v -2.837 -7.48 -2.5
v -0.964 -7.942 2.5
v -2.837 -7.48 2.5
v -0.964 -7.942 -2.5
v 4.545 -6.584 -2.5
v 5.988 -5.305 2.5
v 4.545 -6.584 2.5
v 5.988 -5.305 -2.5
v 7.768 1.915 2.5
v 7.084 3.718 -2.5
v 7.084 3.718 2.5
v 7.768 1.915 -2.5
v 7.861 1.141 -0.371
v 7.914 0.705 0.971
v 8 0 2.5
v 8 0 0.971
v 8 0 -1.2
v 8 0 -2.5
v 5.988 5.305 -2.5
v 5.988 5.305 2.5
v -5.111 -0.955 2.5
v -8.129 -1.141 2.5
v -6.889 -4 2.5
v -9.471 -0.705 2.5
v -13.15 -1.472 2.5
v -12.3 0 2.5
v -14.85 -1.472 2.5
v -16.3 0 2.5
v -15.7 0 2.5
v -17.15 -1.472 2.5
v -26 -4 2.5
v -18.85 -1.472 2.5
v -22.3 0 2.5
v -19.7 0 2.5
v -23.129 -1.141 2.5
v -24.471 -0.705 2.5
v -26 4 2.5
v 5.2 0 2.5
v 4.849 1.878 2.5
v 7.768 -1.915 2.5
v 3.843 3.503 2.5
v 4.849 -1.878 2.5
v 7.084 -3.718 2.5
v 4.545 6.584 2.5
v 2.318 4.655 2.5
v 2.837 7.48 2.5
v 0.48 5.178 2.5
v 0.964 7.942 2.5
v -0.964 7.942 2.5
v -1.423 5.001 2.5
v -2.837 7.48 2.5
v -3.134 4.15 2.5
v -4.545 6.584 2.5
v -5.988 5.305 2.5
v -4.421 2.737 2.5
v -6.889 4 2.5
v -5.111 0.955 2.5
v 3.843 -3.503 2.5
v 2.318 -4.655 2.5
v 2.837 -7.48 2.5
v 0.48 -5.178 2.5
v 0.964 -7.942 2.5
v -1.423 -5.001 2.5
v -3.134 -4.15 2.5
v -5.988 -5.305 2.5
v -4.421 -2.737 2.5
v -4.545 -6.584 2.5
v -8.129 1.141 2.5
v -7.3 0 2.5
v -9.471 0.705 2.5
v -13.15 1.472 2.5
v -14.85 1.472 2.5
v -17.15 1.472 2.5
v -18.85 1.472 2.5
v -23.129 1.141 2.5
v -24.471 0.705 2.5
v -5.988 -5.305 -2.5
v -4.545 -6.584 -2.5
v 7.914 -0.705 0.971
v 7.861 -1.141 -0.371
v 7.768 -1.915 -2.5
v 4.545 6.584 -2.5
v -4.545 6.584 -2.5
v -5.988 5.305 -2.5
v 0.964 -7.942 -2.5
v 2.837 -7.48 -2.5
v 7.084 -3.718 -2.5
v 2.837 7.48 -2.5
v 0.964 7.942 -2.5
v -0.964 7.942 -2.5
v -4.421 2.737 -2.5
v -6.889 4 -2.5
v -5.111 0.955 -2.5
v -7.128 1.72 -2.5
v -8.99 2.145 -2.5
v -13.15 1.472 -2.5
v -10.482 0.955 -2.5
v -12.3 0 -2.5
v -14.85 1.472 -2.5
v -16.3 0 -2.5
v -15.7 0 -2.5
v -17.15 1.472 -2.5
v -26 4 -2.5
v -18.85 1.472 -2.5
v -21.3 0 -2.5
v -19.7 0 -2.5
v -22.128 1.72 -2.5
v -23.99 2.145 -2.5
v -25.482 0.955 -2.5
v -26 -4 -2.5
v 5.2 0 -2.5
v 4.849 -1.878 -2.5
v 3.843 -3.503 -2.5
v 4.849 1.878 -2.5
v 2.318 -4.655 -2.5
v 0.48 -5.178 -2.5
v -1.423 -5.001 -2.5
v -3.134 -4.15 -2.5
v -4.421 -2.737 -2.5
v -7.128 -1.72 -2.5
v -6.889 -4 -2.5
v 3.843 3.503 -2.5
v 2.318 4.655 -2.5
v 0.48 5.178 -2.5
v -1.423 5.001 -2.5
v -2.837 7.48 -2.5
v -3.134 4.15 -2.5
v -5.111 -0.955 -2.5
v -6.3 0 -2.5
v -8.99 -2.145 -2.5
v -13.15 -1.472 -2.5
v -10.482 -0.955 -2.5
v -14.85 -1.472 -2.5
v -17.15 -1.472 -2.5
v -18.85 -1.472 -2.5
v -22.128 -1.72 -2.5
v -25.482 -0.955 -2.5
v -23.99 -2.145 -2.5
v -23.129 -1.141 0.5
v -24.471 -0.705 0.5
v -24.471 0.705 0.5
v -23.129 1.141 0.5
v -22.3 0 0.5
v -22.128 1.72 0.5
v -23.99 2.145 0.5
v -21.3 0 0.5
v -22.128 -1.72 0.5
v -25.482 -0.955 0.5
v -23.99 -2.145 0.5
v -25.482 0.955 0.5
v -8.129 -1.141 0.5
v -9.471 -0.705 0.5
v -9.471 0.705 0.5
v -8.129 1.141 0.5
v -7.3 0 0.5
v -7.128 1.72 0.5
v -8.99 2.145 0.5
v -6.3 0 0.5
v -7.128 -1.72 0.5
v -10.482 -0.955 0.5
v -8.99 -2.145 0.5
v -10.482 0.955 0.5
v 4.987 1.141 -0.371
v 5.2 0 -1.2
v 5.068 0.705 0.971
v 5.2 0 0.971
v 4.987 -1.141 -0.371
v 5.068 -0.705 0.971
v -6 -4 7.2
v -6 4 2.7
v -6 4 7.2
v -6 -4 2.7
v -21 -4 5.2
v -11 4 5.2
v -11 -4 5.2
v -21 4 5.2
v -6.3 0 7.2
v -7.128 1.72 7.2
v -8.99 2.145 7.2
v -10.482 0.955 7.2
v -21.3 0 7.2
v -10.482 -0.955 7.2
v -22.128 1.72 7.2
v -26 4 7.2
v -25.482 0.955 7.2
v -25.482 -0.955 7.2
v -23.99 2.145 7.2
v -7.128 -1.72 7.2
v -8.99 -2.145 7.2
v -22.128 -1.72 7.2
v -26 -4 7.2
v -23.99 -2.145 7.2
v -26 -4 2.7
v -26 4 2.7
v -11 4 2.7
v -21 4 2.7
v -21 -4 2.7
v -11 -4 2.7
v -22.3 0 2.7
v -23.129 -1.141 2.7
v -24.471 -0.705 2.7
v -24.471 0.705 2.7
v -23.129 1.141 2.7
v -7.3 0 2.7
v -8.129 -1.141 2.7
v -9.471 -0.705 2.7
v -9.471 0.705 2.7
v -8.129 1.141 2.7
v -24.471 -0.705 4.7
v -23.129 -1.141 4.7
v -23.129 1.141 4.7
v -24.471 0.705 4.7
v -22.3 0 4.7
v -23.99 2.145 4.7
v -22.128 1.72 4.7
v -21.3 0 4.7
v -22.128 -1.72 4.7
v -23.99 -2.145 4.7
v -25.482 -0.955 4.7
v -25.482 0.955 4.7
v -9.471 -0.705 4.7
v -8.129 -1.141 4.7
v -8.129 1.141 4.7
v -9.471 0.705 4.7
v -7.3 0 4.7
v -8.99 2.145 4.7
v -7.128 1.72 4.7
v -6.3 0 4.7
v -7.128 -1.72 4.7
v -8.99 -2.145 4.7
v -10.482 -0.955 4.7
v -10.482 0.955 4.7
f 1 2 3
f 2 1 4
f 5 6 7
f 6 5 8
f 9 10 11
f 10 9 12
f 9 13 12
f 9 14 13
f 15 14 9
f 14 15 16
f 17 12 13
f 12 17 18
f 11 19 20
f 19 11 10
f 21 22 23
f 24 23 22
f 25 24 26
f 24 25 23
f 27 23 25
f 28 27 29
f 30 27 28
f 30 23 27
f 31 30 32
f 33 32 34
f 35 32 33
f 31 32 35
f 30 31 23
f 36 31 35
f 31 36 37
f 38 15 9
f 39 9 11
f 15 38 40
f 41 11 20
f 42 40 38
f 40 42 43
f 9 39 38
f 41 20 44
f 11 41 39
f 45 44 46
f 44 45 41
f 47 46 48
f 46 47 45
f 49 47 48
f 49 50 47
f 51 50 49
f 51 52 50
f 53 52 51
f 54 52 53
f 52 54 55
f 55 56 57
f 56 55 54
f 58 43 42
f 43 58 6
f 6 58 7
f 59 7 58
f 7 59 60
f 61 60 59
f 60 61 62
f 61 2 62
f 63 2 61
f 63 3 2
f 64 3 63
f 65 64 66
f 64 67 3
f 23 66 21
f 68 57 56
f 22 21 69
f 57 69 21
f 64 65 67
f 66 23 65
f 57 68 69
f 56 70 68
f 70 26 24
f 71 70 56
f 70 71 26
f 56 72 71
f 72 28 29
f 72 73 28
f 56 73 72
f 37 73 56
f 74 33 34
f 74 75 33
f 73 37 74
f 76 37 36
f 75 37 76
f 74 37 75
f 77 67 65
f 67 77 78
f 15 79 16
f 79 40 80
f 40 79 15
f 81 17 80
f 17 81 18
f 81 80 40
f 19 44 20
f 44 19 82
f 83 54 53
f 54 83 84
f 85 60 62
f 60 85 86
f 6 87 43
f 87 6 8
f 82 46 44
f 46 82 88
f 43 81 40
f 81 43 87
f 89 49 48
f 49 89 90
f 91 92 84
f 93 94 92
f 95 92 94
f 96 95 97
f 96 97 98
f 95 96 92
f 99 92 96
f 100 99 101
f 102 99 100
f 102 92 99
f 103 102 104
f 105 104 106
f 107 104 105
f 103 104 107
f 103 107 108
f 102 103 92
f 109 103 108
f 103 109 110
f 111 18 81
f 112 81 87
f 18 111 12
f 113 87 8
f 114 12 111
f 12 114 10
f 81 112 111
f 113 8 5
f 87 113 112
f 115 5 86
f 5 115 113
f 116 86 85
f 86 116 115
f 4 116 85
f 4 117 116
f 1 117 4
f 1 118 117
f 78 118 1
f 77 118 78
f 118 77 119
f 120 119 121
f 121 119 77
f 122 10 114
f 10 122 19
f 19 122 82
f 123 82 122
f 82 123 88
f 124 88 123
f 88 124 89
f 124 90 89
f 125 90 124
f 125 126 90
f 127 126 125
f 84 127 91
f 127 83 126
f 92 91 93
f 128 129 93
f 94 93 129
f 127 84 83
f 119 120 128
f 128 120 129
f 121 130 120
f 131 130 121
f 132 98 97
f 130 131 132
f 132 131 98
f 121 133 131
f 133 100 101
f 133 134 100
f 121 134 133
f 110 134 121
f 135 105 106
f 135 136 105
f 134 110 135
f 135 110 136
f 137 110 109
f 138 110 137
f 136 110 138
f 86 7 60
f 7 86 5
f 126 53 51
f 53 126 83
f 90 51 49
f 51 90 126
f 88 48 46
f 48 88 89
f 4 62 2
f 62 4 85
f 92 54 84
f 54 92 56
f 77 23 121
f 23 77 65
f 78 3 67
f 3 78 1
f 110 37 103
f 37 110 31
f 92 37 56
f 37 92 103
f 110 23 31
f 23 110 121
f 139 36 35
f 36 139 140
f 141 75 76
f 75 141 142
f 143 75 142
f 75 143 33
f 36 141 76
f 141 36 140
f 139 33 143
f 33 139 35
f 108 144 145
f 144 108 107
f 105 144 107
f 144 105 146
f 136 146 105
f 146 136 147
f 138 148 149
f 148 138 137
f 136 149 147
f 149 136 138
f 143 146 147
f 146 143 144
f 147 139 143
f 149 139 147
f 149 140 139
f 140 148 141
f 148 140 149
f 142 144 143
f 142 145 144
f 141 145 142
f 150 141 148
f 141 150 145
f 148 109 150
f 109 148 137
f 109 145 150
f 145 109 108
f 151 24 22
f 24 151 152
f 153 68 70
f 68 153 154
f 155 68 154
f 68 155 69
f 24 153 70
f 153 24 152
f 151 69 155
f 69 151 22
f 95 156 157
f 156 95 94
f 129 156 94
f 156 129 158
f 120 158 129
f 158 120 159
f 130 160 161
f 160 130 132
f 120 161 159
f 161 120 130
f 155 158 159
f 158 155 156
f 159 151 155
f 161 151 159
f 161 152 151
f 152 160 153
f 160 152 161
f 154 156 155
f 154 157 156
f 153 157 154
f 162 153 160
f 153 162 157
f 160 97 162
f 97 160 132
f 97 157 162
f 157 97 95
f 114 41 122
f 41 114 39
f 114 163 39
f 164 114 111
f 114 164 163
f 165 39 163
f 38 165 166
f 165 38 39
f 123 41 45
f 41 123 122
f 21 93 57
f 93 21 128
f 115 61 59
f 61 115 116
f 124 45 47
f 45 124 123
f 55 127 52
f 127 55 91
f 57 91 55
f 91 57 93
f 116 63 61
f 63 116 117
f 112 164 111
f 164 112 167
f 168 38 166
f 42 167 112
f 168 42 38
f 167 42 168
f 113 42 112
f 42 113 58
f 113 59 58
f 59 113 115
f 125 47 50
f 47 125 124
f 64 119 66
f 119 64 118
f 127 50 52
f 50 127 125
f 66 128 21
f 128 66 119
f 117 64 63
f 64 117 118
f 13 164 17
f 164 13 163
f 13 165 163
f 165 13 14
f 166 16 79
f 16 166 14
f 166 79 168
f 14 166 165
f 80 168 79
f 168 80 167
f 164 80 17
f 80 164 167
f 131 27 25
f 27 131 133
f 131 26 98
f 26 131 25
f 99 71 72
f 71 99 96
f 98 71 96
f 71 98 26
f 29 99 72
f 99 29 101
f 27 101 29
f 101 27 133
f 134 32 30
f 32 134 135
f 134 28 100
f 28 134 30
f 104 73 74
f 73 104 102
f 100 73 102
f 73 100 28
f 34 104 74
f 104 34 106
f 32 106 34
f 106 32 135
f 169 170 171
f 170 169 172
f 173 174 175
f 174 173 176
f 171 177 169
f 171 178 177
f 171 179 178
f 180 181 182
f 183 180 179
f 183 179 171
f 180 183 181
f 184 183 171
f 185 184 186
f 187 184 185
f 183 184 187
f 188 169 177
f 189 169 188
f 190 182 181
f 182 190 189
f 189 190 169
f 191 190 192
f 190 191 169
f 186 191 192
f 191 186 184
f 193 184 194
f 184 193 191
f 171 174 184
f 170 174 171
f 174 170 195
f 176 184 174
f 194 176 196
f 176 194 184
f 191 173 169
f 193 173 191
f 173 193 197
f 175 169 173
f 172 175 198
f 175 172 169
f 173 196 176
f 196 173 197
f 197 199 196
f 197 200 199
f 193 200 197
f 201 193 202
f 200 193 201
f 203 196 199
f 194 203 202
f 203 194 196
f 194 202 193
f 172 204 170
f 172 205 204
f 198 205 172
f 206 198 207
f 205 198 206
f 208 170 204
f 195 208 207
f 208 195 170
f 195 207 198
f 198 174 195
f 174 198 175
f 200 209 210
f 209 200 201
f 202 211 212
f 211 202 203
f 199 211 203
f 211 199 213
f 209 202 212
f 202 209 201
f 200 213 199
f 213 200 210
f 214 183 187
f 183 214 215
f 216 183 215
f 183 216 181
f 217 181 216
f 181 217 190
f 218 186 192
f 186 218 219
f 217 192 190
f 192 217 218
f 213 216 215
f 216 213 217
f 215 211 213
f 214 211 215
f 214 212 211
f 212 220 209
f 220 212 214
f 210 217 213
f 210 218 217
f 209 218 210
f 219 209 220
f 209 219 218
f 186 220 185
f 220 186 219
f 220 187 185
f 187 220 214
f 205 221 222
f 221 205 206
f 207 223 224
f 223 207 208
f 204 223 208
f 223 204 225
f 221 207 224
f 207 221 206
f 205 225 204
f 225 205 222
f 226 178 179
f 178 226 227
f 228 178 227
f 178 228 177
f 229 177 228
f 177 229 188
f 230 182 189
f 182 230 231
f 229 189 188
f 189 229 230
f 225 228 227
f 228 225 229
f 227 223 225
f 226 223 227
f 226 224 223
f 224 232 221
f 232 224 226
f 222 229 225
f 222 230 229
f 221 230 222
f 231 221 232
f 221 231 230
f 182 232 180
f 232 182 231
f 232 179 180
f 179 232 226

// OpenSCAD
module screw_hole()
{
    translate(v = [ 0, 0, -2 ]) cylinder(h = 5, r = 1.2, center = true);
    translate(v = [ 0, 0, 2 ]) cylinder(h = 5, r = 2.2, center = true);
}

module blade_mover_bottom()
{
    difference()
    {
        union()
        {
            cylinder(h = 5, r = 8, center = true);
            translate(v = [ -16, 0, 0 ]) //
                cube(size = [ 20, 8, 5 ], center = true);
        }
        cylinder(h = 6, r = 5.2, center = true);

        translate(v = [ 3, 0, 0 ])          //
            rotate(a = 90, v = [ 0, 1, 0 ]) //
            cylinder(h = 5, r = 1.2);


        translate(v = [ -23.5, 0, 0 ]) //
            mirror([ 0, 0, 1 ])        //
            screw_hole();

        translate(v = [ -8.5, 0, 0 ]) //
            mirror([ 0, 0, 1 ])       //
            screw_hole();

        translate(v = [ -14, 0, 0 ]) //
            cylinder(h = 8, r = 1.7, center=true);
        translate(v = [ -18, 0, 0 ]) //
            cylinder(h = 8, r = 1.7, center=true);
    }
}

module blade_mover_cover()
{

    difference()
    {
        translate(v = [ -15, 0, -1 ]) //
            union()
        {
            cube(size = [ 20, 8, 2 ], center = true);

            translate(v = [ -7.5, 0, 2 ]) //
                cube(size = [ 5, 8, 3 ], center = true);

            translate(v = [ 7.5, 0, 2 ]) //
                cube(size = [ 5, 8, 3 ], center = true);
        }

        translate(v = [ -22.5, 0, 0 ]) //
            mirror([ 0, 0, 1 ])        //
            screw_hole();

        translate(v = [ -7.5, 0, 0 ]) //
            mirror([ 0, 0, 1 ])       //
            screw_hole();

    }
}

module blade_mover()
{
    blade_mover_bottom();
    translate(v = [ -1, 0, 5.2 ]) //
        mirror(v = [ 0, 0, 1 ])  //
        blade_mover_cover();
}

blade_mover();
